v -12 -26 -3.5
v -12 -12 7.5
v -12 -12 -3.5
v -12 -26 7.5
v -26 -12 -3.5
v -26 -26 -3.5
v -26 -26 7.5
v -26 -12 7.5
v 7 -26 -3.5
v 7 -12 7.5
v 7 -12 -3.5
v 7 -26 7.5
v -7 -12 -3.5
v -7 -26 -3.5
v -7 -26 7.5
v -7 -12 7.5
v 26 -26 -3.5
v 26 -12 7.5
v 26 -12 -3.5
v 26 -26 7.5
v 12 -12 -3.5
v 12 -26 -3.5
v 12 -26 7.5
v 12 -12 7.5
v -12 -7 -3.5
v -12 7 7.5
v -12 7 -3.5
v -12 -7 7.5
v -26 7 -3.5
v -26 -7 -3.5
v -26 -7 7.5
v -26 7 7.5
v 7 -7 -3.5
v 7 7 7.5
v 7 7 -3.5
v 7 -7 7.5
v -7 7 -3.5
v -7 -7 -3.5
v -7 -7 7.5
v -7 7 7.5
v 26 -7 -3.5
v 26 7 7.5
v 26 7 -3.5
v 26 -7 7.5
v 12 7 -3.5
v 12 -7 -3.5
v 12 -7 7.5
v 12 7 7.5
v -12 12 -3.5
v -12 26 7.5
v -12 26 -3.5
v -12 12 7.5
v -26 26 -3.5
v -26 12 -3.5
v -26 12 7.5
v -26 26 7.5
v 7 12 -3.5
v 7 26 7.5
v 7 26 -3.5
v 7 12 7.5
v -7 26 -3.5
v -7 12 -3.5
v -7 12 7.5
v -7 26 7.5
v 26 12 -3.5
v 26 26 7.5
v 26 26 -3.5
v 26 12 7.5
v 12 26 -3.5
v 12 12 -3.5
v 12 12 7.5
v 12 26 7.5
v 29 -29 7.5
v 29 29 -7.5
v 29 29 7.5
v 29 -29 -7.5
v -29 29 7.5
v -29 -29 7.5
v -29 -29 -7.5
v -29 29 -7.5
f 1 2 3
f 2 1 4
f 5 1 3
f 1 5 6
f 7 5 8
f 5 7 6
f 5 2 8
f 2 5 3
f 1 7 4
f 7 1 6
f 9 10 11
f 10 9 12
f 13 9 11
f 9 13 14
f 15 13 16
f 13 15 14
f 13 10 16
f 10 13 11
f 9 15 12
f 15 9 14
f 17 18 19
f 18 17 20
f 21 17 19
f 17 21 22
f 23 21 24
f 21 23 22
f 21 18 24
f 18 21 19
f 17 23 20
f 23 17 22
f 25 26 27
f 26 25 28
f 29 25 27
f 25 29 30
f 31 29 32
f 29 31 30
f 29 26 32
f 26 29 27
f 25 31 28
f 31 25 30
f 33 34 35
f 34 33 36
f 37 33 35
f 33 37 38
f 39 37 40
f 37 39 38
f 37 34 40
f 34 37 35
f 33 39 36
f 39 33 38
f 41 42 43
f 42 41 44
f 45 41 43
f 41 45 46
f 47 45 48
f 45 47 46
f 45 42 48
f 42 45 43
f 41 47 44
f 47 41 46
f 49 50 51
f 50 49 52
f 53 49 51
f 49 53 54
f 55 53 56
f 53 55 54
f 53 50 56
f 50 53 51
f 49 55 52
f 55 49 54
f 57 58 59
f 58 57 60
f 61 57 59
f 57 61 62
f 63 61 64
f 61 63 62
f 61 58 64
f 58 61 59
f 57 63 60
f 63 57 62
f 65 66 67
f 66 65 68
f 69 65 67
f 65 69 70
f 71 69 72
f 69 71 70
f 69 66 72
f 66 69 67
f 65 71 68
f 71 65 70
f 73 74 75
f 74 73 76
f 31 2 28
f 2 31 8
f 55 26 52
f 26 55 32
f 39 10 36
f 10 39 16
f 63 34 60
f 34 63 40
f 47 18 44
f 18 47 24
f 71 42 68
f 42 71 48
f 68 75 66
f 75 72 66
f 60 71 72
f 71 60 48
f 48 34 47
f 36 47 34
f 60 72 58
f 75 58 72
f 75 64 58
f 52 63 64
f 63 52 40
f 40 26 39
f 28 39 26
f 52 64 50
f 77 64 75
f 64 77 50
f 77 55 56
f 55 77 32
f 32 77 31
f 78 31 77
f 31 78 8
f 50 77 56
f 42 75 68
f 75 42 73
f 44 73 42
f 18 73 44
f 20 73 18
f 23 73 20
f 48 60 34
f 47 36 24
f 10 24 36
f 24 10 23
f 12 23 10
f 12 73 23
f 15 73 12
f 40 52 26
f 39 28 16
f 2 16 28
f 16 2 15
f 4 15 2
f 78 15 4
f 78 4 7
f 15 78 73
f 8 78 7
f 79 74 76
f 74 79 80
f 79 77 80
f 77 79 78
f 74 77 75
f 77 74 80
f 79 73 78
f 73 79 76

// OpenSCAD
$fn = 32;

// ----------------------------------------------------------------------
// Pocket plate 58 x 58 x 15
// 3 x 3 pockets 14 mm square, 11 mm deep
// ----------------------------------------------------------------------

// --- parameters (mm) ---
thickness = 15;  // plate thickness
floor_t = 4;     // material left under each pocket
pocket = 14;     // pocket side length
pitch_x = 19;    // pocket pitch along X
pitch_y = 19;    // pocket pitch along Y
cols = 3;        // pockets per row
rows = 3;        // rows of pockets

// --- derived feature positions (mm) ---
depth = thickness - floor_t;        // = 11   pocket depth, down to the floor
span_x = (cols - 1) * pitch_x;      // = 38   distance between outer pockets
span_y = (rows - 1) * pitch_y;      // = 38   distance between outer pocket rows
origin_x = -span_x / 2;             // = -19   X of the first pocket
origin_y = -span_y / 2;             // = -19   Y of the first pocket
plate = [span_x + pocket + 6, span_y + pocket + 6, thickness];  // = [58, 58, 15]   overall size: pockets plus 3 mm of wall on each side
feature_centers = [
  [origin_x + 0 * pitch_x, origin_y + 0 * pitch_y],
  [origin_x + 1 * pitch_x, origin_y + 0 * pitch_y],
  [origin_x + 2 * pitch_x, origin_y + 0 * pitch_y],
  [origin_x + 0 * pitch_x, origin_y + 1 * pitch_y],
  [origin_x + 1 * pitch_x, origin_y + 1 * pitch_y],
  [origin_x + 2 * pitch_x, origin_y + 1 * pitch_y],
  [origin_x + 0 * pitch_x, origin_y + 2 * pitch_y],
  [origin_x + 1 * pitch_x, origin_y + 2 * pitch_y],
  [origin_x + 2 * pitch_x, origin_y + 2 * pitch_y]
];   // pocket centres, used verbatim by the cutter loop

// plate outline, then one pocket per centre in feature_centers
difference() {
  cube(plate, center = true);
  for (centre = feature_centers)
    translate([centre[0] - pocket / 2, centre[1] - pocket / 2, plate[2] / 2 - depth])
      cube([pocket, pocket, depth + 1]);  // centred on the declared pocket centre
}
